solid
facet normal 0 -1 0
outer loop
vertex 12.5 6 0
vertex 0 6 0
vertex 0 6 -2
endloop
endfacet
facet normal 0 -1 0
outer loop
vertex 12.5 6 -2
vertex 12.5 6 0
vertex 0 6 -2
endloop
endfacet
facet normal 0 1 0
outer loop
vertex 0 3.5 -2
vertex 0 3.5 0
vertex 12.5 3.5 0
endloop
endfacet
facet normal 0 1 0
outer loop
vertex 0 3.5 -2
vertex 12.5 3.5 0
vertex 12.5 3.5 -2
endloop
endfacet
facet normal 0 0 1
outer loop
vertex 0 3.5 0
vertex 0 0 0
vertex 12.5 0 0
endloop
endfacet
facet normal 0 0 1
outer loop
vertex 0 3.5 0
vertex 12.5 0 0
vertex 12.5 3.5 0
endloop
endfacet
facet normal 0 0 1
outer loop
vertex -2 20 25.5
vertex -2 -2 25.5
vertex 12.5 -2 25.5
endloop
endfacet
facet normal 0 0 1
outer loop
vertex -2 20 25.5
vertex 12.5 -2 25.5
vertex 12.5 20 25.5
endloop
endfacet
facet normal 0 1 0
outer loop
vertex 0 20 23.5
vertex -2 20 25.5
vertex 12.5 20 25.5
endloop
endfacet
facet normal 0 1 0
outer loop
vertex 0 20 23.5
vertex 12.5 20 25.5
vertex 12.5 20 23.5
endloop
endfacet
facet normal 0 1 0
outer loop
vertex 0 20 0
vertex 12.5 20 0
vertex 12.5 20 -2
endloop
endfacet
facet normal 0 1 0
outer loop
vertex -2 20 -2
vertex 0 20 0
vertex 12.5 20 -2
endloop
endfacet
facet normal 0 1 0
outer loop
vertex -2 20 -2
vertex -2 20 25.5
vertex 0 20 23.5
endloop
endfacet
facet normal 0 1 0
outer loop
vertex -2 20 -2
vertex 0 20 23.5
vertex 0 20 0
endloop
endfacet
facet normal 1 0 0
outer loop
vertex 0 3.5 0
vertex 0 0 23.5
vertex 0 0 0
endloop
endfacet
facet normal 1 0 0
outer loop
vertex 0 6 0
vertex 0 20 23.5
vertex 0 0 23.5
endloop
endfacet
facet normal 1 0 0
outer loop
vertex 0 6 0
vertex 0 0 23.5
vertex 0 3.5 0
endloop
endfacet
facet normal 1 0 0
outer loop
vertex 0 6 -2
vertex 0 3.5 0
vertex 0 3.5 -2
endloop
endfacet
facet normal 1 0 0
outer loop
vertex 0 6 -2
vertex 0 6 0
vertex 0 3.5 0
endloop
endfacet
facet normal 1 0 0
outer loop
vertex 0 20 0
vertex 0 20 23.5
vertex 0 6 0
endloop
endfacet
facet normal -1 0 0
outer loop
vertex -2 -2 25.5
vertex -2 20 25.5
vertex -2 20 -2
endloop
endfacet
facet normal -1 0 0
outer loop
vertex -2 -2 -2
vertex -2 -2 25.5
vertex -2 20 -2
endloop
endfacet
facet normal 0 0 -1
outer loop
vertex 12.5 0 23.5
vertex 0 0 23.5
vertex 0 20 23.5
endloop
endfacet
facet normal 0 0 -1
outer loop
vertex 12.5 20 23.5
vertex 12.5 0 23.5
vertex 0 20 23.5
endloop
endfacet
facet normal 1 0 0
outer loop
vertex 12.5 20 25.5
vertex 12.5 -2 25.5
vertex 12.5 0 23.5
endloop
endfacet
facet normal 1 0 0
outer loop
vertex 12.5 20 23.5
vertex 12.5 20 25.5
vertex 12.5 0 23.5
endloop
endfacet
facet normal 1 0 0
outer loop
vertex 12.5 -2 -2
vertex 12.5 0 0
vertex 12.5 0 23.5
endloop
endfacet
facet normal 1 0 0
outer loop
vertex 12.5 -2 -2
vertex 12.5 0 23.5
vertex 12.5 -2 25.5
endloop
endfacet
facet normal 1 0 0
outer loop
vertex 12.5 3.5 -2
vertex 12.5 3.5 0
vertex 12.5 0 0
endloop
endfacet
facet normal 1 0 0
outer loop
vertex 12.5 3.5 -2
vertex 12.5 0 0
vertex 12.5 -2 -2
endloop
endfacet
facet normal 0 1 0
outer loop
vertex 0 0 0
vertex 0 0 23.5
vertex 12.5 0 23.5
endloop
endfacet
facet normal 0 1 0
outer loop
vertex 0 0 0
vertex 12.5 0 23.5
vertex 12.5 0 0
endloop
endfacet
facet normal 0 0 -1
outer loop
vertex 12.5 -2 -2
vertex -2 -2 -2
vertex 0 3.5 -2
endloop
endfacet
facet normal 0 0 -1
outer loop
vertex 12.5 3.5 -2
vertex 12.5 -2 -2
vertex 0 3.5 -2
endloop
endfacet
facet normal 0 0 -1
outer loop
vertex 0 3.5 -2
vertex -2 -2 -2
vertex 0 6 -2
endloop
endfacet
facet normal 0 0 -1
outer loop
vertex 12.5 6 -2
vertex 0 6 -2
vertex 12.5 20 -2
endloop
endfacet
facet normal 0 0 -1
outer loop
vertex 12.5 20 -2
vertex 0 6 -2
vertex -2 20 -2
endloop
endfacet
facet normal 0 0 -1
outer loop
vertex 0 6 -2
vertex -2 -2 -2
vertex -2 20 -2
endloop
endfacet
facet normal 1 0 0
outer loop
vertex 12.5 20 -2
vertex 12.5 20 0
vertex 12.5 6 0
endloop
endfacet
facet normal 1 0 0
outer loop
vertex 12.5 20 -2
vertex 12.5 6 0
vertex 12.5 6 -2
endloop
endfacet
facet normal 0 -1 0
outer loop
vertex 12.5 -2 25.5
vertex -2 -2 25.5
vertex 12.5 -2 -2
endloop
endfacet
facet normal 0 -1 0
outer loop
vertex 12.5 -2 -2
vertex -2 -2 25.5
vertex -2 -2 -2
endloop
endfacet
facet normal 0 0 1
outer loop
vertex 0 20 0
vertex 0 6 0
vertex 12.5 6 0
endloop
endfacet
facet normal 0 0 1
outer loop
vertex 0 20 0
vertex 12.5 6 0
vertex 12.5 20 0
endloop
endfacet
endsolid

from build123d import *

# Parameters (mm, degrees)
SKETCH_2_W          = 23.5
SKETCH_2_H          = 18
EXTRUDE_1_DEPTH     = 12.5
SHELL_7_T           = 2
SKETCH_4_W          = 2
SKETCH_4_H          = 2.5
CUT_EXTRUDE_3_DEPTH = 35.734708866
SKETCH_6_W          = 12.5
SKETCH_6_H          = 23.5
CUT_EXTRUDE_4_DEPTH = 35.734708866


with BuildPart() as part:
    # Эскиз2 → Бобышка-Вытянуть1 (new body)
    with BuildSketch(Plane(origin=(0, 0, 0), x_dir=(0, 0, -1), z_dir=(1, 0, 0))):
        with Locations((-11.75, 9)):
            Rectangle(SKETCH_2_W, SKETCH_2_H)
    extrude(amount=EXTRUDE_1_DEPTH)

    # Оболочка7
    shell_7_openings = [part.faces().sort_by_distance(p)[0] for p in [
        (12.5, 9, 11.75),
    ]]
    offset(amount=SHELL_7_T, openings=shell_7_openings, kind=Kind.INTERSECTION)

    # Эскиз4 → Вырез-Вытянуть3 (cut, through all)
    with BuildSketch(Plane(origin=(0, 0, 0), x_dir=(0, 0, -1), z_dir=(1, 0, 0))):
        with Locations((1, 4.75)):
            Rectangle(SKETCH_4_W, SKETCH_4_H)
    extrude(amount=CUT_EXTRUDE_3_DEPTH, mode=Mode.SUBTRACT)

    # Эскиз6 → Вырез-Вытянуть4 (cut, through all)
    with BuildSketch(Plane.XZ.offset(-18)):
        with Locations((6.25, 11.75)):
            Rectangle(SKETCH_6_W, SKETCH_6_H)
    extrude(amount=-CUT_EXTRUDE_4_DEPTH, mode=Mode.SUBTRACT)


solid = part.part
